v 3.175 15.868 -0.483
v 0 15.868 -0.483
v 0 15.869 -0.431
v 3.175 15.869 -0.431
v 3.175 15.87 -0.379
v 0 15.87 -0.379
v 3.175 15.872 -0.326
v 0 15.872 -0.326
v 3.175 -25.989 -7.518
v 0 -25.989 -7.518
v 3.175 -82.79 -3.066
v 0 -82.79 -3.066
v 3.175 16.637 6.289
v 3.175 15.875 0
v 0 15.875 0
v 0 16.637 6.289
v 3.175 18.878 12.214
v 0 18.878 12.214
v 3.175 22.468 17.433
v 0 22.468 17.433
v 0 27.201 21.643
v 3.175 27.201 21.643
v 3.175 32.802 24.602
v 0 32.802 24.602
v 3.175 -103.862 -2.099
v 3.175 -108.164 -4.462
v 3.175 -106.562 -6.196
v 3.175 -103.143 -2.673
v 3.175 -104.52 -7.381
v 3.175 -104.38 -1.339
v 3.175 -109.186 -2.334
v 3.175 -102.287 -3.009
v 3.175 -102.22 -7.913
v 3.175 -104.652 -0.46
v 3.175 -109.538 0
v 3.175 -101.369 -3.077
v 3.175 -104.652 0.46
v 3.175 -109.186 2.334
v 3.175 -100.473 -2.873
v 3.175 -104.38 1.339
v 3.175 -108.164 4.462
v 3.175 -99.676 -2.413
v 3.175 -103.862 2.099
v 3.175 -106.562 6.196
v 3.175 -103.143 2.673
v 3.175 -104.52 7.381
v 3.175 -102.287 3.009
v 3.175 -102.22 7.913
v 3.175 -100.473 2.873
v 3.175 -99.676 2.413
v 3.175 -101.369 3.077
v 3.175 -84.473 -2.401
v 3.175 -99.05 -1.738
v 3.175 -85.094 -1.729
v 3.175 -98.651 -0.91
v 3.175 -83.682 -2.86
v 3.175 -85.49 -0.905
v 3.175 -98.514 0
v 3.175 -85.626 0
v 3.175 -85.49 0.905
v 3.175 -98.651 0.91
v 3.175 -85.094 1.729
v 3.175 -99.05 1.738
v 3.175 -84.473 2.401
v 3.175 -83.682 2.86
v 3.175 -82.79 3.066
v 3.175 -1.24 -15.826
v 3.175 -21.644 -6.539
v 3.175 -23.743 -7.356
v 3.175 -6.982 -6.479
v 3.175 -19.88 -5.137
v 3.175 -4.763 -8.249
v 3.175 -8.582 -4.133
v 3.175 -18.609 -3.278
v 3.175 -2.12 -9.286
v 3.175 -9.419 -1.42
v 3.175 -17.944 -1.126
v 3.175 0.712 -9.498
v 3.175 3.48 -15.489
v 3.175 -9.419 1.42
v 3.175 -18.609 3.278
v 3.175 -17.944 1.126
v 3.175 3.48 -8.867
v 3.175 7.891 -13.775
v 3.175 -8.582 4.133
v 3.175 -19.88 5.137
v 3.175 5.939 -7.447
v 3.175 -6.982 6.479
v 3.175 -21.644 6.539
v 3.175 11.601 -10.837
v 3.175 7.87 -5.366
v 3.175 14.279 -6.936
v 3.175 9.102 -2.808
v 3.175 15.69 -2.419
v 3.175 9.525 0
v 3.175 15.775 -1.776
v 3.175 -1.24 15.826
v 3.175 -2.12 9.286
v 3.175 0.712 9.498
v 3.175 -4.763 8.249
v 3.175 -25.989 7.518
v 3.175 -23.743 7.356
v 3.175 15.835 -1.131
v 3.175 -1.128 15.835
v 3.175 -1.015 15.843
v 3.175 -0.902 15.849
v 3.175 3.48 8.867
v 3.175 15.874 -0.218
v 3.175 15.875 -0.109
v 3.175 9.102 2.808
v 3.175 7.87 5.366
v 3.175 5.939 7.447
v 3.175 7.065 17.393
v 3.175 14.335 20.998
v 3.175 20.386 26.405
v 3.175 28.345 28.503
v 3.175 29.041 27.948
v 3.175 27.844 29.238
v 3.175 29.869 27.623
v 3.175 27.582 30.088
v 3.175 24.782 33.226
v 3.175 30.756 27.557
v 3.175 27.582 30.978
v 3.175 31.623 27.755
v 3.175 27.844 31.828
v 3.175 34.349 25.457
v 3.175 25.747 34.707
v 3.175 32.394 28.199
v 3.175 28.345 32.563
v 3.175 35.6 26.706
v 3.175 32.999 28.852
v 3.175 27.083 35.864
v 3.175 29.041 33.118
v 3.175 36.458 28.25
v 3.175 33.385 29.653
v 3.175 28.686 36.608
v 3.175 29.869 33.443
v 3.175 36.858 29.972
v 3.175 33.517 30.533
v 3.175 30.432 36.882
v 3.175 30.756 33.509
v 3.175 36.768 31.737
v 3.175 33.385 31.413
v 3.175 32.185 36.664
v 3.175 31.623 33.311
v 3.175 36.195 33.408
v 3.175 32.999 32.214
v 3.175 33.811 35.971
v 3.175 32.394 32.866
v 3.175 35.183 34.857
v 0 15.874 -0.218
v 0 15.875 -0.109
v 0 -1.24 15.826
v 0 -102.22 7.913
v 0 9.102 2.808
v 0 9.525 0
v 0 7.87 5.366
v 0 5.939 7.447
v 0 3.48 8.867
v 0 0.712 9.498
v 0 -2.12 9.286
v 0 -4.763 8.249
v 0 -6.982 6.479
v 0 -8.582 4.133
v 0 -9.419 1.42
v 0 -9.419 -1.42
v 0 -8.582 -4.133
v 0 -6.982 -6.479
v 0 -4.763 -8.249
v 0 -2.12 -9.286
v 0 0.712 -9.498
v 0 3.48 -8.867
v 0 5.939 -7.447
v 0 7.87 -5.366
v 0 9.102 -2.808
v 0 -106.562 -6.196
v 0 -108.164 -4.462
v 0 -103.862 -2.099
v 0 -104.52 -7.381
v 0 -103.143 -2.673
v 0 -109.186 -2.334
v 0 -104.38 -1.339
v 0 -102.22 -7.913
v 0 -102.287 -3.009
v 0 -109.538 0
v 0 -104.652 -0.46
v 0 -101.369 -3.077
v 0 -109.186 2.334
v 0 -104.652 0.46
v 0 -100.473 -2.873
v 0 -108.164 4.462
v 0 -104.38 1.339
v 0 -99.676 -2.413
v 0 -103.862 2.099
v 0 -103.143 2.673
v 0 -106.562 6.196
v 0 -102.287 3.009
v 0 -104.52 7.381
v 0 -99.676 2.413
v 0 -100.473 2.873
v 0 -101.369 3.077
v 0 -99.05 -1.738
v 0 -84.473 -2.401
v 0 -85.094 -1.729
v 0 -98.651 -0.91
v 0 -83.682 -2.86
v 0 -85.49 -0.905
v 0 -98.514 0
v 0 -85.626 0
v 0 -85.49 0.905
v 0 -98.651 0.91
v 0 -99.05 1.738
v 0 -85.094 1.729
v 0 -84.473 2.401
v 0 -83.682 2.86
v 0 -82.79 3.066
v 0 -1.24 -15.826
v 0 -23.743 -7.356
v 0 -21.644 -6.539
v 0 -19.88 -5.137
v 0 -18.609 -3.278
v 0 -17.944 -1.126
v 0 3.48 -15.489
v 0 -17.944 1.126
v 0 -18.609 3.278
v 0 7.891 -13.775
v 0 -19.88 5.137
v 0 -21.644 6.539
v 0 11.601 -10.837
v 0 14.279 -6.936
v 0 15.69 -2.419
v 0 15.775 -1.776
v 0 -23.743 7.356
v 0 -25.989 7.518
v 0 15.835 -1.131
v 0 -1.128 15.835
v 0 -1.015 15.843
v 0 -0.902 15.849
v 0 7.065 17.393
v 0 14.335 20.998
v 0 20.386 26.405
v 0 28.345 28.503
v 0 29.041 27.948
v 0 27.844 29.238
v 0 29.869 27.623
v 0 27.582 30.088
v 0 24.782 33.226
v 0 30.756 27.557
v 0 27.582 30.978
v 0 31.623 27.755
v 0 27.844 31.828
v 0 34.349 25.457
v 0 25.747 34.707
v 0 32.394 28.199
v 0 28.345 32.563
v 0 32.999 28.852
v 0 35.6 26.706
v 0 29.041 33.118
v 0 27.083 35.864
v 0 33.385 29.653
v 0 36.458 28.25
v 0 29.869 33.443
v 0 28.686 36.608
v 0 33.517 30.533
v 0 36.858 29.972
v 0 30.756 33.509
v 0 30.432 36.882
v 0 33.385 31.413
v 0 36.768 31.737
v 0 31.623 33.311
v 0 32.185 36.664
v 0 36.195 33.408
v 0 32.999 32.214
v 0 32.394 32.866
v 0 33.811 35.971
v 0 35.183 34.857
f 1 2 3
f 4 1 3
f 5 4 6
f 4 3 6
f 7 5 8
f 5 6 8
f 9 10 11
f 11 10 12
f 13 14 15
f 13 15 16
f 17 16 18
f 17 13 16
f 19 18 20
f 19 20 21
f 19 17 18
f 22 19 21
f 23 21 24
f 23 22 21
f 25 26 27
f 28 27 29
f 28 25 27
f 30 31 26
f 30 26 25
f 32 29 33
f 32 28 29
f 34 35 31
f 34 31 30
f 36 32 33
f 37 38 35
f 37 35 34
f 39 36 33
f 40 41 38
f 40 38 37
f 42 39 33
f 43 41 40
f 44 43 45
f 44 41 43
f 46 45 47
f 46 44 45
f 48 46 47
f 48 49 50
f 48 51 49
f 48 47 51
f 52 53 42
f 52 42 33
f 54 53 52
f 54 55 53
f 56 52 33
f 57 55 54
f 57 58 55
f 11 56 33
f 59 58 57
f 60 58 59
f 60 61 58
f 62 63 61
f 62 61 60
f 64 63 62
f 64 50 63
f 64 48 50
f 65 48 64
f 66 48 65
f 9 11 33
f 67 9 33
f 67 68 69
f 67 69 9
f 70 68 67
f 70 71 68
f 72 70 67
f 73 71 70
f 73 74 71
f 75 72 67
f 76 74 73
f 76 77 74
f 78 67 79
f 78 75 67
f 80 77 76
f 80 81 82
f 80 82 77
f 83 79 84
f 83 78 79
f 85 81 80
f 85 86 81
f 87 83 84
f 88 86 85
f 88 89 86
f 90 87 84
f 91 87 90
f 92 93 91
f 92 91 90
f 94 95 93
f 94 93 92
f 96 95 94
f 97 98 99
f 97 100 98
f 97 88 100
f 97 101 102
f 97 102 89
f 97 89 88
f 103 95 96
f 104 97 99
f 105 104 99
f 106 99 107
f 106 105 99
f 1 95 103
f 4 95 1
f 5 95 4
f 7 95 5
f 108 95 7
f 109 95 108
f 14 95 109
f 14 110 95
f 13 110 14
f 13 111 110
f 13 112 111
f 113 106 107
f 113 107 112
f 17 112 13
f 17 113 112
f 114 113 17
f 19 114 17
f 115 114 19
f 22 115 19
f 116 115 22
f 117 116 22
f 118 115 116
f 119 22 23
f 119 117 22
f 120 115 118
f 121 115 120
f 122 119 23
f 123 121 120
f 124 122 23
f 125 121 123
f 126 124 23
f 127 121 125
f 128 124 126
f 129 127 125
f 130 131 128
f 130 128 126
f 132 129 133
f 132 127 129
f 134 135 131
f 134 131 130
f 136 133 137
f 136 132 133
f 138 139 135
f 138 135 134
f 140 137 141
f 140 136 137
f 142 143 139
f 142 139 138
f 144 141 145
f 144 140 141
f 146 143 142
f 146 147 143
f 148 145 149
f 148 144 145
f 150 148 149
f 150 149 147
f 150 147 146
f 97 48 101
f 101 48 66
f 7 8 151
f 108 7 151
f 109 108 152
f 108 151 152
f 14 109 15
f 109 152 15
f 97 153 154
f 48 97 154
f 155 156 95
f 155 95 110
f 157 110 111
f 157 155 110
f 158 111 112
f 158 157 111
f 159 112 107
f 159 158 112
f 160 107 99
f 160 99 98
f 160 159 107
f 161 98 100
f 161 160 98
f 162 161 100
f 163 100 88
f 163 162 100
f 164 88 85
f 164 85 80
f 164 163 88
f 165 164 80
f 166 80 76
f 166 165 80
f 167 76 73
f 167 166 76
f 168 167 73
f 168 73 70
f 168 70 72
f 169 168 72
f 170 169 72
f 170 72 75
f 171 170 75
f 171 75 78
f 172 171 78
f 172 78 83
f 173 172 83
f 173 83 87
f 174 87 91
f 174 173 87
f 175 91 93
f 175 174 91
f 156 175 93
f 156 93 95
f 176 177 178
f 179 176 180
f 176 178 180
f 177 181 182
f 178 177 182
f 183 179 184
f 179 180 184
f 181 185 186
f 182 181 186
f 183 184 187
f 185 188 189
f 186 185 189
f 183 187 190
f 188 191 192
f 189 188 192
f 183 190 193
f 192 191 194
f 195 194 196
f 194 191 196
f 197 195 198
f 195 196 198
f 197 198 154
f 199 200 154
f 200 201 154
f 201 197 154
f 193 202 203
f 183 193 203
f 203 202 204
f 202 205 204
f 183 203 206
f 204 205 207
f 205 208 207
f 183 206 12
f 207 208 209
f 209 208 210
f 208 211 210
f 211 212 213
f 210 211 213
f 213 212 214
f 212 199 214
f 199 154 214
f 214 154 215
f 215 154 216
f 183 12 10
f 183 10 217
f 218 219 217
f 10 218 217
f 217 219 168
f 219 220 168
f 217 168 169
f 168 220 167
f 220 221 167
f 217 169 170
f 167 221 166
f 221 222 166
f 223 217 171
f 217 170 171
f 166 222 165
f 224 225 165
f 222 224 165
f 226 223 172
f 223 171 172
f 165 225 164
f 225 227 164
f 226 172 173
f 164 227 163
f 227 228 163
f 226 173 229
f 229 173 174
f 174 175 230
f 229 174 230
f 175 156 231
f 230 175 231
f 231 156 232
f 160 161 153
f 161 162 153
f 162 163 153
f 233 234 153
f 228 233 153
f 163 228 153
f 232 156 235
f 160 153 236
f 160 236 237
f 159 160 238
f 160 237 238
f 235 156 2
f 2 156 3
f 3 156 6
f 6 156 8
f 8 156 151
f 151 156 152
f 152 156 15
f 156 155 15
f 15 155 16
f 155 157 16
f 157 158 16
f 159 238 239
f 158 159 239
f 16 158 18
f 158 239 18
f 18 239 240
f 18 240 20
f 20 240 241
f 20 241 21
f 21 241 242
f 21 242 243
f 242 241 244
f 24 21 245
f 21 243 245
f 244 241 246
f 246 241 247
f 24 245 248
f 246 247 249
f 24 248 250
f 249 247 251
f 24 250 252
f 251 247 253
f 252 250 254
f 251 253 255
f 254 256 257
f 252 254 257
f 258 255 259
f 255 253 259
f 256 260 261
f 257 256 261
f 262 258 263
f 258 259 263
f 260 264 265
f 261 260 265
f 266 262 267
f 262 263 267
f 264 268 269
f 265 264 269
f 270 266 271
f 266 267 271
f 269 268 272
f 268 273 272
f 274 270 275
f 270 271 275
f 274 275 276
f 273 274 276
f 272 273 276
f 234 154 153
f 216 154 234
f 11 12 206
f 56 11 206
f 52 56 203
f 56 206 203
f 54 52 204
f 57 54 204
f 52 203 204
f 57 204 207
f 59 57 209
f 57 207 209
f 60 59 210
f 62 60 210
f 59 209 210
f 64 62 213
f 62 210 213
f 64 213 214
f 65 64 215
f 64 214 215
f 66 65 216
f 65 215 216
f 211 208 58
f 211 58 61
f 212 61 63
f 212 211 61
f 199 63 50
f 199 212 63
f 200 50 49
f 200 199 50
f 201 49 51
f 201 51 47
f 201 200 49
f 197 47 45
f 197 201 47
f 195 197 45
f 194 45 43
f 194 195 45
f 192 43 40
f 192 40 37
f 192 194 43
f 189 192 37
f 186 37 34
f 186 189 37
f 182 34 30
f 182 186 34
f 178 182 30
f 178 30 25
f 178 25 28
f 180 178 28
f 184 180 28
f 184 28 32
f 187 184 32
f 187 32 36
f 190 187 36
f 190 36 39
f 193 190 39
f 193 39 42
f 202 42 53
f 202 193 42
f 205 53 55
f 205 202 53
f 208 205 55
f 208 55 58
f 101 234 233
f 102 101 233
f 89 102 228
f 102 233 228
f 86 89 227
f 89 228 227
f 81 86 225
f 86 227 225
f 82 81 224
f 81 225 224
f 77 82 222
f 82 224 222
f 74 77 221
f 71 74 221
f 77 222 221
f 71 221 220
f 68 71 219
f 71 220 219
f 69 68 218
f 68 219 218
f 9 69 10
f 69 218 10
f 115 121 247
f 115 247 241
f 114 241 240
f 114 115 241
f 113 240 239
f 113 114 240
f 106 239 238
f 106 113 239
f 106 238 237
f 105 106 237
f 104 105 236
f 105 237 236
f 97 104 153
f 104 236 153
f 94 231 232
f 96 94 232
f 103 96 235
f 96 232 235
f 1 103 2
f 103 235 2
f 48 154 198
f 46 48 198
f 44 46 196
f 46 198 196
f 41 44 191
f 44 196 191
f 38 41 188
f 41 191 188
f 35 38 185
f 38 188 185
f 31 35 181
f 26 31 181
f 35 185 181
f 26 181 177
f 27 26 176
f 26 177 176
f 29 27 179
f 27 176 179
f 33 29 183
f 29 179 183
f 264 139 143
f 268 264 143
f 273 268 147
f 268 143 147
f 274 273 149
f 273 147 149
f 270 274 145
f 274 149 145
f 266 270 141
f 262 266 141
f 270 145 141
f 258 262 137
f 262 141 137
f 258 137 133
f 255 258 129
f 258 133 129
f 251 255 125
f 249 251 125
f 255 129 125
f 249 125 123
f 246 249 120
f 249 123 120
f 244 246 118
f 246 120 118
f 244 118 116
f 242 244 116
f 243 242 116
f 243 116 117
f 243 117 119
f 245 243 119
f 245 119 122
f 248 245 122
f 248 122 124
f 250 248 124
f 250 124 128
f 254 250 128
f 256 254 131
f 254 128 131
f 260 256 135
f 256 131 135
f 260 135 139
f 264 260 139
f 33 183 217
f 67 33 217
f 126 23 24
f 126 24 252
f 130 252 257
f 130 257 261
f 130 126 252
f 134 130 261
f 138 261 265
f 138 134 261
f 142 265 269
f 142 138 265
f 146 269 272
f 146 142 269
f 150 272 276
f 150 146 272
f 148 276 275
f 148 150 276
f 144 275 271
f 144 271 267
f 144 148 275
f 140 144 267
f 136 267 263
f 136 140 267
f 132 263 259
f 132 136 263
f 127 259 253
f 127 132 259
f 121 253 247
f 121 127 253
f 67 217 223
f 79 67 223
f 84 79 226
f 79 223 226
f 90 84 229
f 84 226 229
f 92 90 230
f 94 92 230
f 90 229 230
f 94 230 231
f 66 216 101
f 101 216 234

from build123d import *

# Parameters (mm, degrees)
F0_R     = 9.525
F0_R_2   = 3.0861
F1_DEPTH = 3.175
F2_R     = 2.9845
F3_DEPTH = 3.175


with BuildPart() as f1:
    # F0 (on Right) → F1 (new body)
    with BuildSketch(Plane.YZ):
        with BuildLine():
            Line((-102.220117, -7.91324), (-1.240234, -15.826479))
            ThreePointArc((-1.240234, -15.826479), (9.855756, -12.445067), (15.68961, -2.419045))
            ThreePointArc((15.68961, -2.419045), (15.808298, -1.453729), (15.867652, -0.482956))
            ThreePointArc((15.867652, -0.482956), (15.869841, -0.404681), (15.871644, -0.326396))
            ThreePointArc((15.871644, -0.326396), (10.897173, 11.544143), (-1.240234, 15.826479))
            Line((-1.240234, 15.826479), (-102.220117, 7.91324))
            ThreePointArc((-102.220117, 7.91324), (-109.5375, 0), (-102.220117, -7.91324))
        make_face()
        with BuildLine():
            ThreePointArc((-25.989111, 7.517578), (-17.859375, 0), (-25.989111, -7.517578))
            Line((-25.989111, -7.517578), (-82.790295, -3.06638))
            ThreePointArc((-82.790295, -3.06638), (-85.625781, 0), (-82.790295, 3.06638))
            Line((-82.790295, 3.06638), (-25.989111, 7.517578))
        make_face(mode=Mode.SUBTRACT)
        Circle(F0_R, mode=Mode.SUBTRACT)
        with Locations((-101.6, 0)):
            Circle(F0_R_2, mode=Mode.SUBTRACT)
    extrude(amount=F1_DEPTH)

    # F2 (on face) → F3 (join)
    with BuildSketch(Plane.YZ.offset(3.175)):
        with BuildLine():
            ThreePointArc((32.802387, 24.602289), (35.182837, 34.857256), (24.782335, 33.226167))
            ThreePointArc((24.782335, 33.226167), (14.335256, 20.997637), (-0.901989, 15.849355))
            ThreePointArc((-0.901989, 15.849355), (10.901756, 11.539816), (15.875, 0))
            ThreePointArc((15.875, 0), (20.515606, 14.931586), (32.802387, 24.602289))
        make_face()
        with Locations((30.532871, 30.532871)):
            Circle(F2_R, mode=Mode.SUBTRACT)
    extrude(amount=-F3_DEPTH)


solid = f1.part
